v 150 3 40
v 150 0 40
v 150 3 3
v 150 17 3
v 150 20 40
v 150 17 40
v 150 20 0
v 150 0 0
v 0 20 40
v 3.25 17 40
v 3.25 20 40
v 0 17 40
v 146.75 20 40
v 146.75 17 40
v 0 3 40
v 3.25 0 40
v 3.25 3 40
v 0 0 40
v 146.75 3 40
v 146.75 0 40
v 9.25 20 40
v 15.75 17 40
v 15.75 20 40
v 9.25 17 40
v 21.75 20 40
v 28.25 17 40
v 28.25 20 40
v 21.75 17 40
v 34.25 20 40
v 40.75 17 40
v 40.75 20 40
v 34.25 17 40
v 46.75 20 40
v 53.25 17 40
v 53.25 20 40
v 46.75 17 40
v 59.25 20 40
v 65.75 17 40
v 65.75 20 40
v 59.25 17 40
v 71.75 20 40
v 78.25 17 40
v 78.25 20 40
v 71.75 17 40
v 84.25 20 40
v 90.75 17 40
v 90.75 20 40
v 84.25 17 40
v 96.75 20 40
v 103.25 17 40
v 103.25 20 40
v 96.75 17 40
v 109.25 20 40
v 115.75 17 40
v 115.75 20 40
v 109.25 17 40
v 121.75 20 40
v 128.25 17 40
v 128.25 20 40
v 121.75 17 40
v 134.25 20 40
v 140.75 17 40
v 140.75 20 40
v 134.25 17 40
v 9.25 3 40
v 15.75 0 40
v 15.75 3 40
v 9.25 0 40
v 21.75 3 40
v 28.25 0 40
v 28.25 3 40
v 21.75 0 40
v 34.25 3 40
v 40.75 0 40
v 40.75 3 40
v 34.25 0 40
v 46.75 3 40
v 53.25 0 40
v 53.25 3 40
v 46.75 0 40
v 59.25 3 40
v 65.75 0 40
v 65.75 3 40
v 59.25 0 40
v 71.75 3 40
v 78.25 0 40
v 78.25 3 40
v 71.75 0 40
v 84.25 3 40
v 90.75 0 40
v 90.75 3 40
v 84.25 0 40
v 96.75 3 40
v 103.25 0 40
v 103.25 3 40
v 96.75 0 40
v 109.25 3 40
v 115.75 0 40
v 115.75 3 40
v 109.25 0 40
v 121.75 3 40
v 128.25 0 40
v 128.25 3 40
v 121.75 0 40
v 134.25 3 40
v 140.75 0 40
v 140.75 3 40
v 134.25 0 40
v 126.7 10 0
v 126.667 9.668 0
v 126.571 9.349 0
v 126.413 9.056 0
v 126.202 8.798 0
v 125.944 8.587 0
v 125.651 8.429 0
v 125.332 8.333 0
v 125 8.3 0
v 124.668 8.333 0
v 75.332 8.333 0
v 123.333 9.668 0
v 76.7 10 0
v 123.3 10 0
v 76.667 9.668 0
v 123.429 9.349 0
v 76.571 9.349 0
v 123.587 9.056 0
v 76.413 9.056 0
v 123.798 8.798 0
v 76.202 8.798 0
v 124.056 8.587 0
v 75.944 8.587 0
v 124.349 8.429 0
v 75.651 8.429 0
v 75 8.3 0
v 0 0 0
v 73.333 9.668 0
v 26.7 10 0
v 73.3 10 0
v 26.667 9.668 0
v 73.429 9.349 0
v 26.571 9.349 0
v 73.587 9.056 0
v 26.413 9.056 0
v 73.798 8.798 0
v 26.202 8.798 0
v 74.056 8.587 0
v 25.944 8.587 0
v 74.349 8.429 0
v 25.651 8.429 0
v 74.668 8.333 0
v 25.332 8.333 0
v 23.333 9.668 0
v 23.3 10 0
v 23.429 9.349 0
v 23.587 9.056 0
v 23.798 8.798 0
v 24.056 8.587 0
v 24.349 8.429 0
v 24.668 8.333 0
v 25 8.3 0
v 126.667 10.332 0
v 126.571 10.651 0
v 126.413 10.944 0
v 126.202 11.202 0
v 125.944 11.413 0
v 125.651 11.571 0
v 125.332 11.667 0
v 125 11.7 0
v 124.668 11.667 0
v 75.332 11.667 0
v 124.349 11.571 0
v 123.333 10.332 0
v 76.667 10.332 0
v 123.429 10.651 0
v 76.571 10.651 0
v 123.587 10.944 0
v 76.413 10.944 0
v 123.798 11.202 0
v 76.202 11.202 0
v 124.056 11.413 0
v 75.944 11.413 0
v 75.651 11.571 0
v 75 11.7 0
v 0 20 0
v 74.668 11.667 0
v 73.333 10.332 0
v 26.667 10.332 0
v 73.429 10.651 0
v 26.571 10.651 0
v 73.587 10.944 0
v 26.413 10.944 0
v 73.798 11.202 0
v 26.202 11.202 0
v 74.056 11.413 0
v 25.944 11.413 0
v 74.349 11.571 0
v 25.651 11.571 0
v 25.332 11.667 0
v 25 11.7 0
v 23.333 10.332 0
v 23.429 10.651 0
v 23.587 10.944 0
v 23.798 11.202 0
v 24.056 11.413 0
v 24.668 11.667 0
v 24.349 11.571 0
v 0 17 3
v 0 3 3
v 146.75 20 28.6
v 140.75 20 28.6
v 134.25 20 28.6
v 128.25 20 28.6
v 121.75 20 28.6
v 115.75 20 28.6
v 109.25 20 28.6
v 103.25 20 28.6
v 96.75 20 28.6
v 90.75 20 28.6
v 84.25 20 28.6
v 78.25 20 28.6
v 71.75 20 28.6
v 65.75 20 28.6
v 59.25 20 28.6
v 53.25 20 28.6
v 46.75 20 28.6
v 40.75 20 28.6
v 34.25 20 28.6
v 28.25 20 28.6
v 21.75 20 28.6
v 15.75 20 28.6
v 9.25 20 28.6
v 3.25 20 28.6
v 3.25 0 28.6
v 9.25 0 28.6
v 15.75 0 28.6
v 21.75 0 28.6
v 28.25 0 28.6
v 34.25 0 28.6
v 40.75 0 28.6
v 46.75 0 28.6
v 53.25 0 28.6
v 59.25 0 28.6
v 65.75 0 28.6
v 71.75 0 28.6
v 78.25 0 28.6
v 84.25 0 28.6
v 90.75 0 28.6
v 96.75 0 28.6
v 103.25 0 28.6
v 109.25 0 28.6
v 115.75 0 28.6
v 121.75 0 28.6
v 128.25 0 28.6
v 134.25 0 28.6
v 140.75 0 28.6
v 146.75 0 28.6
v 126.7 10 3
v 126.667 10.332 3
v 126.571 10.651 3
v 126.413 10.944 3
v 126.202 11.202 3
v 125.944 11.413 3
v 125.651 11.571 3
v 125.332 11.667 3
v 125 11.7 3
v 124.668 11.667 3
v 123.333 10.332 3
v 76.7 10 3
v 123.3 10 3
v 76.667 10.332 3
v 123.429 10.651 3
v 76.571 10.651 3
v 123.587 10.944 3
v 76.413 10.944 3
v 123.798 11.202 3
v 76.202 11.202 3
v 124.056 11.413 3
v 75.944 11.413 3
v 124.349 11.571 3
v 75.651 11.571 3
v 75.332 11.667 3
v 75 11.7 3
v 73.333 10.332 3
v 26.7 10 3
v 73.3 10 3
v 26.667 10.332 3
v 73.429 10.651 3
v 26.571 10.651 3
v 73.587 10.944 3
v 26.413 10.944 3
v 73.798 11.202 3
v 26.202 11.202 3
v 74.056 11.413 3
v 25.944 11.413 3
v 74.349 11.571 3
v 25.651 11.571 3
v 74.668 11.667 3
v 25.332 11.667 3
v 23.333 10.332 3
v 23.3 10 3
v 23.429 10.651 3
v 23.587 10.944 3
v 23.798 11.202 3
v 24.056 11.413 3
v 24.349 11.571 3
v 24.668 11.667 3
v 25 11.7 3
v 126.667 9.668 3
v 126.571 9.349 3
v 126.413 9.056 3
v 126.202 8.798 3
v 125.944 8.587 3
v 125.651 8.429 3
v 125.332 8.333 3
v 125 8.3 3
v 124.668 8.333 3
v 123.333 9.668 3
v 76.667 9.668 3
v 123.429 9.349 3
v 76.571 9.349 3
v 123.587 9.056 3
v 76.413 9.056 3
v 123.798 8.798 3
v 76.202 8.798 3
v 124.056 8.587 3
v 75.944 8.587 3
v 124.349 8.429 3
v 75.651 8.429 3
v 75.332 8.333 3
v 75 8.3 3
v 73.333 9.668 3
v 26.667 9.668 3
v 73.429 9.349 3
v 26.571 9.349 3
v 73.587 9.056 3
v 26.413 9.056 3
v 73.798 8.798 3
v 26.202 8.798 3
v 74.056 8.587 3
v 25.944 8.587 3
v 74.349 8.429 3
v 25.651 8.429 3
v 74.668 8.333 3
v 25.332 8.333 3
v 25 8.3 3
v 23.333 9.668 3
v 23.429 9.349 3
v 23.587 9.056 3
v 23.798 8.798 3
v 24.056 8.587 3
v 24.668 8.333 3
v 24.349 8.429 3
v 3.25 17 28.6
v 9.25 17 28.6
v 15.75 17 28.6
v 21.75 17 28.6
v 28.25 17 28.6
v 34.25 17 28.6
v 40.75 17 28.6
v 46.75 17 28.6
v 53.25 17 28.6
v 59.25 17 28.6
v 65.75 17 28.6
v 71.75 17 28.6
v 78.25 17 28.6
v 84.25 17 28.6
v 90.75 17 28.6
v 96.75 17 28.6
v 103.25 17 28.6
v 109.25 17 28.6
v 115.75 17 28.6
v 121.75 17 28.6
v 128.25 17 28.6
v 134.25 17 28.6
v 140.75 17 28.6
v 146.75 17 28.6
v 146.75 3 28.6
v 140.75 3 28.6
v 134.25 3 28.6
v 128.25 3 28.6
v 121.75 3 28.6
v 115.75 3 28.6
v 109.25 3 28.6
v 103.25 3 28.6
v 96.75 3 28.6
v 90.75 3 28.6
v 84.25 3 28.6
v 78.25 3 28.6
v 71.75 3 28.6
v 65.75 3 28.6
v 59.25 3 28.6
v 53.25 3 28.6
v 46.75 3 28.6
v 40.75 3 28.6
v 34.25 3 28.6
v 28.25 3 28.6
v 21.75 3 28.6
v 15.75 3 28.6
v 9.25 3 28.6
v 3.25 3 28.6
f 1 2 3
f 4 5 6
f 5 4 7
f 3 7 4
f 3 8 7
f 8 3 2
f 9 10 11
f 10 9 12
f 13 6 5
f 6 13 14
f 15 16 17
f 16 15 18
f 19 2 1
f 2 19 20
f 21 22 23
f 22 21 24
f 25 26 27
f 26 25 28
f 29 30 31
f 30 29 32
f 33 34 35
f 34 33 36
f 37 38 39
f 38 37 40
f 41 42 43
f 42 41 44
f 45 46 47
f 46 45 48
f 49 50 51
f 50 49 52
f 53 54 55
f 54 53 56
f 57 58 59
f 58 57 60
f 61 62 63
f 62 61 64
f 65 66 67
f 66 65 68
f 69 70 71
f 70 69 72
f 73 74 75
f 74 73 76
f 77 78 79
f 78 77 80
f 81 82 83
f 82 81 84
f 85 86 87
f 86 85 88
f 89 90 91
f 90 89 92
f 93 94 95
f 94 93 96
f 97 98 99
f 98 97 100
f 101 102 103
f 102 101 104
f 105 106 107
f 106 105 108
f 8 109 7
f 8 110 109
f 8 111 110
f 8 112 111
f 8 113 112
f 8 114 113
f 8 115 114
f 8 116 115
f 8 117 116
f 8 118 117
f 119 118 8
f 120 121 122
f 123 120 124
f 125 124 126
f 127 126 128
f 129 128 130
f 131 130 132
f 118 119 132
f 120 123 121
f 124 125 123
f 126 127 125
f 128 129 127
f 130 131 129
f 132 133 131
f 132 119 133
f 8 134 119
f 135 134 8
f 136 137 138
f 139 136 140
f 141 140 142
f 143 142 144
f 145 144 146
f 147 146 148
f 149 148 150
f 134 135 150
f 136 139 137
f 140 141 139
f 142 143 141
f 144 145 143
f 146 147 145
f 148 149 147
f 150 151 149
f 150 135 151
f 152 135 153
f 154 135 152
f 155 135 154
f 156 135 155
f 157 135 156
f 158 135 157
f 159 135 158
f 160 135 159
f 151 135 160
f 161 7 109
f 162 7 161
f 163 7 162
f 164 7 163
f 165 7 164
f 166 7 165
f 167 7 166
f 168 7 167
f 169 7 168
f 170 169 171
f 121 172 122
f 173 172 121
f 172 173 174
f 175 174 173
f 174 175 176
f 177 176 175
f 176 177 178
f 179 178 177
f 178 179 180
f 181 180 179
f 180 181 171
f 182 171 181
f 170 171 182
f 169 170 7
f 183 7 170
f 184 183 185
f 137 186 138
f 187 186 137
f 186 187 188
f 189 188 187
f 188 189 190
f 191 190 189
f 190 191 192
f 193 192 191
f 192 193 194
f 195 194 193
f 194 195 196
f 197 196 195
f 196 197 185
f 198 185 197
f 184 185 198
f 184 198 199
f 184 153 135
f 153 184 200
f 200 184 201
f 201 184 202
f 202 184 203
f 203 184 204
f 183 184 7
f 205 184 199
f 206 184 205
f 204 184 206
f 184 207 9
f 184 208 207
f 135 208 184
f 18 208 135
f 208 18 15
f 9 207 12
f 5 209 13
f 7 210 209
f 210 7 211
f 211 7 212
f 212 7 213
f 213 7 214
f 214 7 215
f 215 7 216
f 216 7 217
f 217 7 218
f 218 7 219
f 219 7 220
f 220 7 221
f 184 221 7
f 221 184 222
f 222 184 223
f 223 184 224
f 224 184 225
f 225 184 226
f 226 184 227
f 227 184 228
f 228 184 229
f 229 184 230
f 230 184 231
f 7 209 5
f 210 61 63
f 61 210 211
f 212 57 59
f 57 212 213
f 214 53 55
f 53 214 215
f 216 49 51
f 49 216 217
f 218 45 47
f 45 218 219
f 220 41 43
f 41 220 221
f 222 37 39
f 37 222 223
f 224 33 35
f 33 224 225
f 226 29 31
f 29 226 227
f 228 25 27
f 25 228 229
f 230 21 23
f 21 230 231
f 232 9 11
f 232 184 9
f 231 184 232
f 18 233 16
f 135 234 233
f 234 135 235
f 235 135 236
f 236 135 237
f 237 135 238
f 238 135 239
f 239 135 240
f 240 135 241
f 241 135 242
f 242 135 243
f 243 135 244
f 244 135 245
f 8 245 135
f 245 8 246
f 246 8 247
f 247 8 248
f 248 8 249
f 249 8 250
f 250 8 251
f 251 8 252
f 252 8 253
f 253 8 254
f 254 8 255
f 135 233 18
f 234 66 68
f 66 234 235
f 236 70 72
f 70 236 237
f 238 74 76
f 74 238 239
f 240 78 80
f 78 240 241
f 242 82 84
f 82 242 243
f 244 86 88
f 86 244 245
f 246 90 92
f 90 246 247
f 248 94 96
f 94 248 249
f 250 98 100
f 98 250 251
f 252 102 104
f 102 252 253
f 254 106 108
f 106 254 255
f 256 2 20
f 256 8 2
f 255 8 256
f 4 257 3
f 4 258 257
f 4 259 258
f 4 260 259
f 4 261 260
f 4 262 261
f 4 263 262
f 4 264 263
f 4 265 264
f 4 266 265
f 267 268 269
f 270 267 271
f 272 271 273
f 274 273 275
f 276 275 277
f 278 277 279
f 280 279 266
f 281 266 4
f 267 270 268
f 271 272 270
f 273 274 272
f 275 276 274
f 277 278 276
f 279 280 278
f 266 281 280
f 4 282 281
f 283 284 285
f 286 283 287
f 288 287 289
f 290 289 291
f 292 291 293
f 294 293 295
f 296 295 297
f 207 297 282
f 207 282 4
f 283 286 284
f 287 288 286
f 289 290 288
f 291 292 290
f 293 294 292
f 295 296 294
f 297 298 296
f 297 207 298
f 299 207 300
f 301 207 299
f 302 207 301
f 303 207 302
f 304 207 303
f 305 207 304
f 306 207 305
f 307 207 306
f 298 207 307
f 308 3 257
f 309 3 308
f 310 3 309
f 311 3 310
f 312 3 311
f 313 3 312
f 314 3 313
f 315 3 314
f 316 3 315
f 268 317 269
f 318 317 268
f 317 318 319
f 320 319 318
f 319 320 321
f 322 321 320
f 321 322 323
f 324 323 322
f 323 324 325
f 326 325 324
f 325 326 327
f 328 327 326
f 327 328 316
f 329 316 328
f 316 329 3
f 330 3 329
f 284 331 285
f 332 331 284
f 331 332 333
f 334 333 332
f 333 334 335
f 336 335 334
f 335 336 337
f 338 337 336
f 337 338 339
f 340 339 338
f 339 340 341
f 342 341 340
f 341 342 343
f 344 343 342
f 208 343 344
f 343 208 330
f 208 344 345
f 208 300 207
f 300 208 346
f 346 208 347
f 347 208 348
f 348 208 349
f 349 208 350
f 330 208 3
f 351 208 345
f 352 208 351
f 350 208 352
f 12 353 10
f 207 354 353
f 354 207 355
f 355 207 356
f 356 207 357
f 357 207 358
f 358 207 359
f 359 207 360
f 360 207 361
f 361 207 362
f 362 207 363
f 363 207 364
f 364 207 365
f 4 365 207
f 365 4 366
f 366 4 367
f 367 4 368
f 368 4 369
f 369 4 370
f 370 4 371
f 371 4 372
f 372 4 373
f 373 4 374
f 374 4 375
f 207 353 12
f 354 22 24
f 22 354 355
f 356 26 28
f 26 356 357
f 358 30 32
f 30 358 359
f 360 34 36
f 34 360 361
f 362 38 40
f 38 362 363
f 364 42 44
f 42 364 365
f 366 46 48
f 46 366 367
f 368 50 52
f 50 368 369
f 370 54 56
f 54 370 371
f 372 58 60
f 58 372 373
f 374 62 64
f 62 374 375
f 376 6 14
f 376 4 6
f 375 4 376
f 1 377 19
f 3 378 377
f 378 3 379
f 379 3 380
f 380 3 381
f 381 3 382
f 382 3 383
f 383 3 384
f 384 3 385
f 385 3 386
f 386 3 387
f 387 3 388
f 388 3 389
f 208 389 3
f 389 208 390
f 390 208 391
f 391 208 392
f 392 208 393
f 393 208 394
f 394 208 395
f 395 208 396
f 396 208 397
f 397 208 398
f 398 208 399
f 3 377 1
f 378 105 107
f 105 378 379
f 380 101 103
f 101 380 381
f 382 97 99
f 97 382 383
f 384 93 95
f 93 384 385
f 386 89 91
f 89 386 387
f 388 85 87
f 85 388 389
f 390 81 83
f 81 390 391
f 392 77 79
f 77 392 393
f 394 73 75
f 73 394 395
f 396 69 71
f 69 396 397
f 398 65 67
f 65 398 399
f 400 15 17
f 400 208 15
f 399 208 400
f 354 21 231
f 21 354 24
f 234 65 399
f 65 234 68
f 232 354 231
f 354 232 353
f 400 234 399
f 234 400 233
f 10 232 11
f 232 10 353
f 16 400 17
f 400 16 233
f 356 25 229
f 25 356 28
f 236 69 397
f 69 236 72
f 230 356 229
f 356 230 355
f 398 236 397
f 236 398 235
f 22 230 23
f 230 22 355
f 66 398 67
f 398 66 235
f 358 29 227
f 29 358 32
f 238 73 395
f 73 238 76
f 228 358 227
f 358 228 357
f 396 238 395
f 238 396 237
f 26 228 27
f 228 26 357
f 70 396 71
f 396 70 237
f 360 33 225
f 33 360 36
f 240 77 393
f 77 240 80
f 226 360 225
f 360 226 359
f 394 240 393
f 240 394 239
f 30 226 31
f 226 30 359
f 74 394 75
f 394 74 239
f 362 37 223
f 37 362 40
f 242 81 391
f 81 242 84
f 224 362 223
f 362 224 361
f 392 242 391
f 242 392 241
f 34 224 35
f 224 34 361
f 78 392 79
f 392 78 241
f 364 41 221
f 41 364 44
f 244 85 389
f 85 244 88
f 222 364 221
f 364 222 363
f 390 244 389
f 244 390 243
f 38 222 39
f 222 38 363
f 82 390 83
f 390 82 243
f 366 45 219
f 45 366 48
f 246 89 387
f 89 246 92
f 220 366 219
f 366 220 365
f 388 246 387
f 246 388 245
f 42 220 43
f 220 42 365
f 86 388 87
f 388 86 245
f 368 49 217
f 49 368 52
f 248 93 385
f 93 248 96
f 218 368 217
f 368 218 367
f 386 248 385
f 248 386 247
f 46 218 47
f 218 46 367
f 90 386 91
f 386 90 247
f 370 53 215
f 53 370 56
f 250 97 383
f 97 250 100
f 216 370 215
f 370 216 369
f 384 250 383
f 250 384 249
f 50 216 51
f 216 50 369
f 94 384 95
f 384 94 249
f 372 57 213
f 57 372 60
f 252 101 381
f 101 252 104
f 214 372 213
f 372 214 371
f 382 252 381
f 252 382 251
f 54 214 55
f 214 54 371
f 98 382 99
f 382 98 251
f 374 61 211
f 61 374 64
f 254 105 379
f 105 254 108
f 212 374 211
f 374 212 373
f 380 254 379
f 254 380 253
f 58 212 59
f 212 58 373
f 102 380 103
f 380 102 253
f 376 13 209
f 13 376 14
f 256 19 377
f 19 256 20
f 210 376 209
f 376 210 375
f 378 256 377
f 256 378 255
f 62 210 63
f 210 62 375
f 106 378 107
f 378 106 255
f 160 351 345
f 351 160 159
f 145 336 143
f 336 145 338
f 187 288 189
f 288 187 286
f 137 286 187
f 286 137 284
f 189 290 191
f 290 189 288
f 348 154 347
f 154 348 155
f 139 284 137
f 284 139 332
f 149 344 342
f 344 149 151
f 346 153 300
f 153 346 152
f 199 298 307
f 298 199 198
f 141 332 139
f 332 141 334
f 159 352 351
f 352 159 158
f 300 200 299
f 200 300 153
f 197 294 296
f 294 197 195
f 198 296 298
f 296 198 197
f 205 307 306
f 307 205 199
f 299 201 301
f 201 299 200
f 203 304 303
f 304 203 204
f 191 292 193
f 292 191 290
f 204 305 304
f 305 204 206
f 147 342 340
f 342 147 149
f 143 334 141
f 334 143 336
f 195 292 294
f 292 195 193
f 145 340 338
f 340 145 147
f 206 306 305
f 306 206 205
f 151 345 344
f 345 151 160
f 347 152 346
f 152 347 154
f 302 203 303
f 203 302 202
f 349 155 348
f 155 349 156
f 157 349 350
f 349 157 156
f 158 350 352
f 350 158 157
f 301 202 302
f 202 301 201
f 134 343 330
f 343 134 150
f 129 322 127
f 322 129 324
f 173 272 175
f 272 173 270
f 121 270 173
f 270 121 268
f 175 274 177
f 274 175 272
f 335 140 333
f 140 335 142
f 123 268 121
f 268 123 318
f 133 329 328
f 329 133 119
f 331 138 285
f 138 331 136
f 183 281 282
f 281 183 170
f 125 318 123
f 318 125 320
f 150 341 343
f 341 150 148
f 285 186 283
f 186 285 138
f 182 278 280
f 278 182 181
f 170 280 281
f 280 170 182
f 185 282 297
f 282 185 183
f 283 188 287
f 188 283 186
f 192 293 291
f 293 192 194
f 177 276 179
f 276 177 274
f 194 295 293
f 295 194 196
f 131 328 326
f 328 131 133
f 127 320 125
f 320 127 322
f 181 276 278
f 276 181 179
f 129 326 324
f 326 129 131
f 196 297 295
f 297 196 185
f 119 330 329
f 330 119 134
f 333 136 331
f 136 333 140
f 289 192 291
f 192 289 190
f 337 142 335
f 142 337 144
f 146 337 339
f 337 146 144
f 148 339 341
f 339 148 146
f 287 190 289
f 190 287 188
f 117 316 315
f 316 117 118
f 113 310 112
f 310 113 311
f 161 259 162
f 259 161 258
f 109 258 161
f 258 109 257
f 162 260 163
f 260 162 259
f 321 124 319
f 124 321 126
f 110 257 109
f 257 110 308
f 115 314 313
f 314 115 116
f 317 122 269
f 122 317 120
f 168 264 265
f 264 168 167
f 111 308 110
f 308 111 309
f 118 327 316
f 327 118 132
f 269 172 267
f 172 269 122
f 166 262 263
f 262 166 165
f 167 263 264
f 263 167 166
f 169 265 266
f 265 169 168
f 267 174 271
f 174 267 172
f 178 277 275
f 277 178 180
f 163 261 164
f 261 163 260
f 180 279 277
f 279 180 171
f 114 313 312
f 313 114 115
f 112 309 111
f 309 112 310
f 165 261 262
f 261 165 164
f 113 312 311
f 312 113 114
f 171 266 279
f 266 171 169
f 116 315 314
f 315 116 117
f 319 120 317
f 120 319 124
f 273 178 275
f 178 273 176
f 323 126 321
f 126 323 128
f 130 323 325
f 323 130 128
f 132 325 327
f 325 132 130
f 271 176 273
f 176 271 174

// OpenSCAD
$fn = 32;

// ----------------------------------------------------------------------
// Cable duct: 150 x 20 x 40 mm, 12 fingers
// ----------------------------------------------------------------------

// --- parameters (mm) ---
channel_l = 150;          // duct length, X
channel_w = 20;           // duct width, Y
channel_h = 40;           // duct height, Z
channel_t = 3;            // side wall thickness
floor_t = 3;              // floor thickness
slot_w = 6;               // finger slot width
slot_h = 25.6;            // finger slot height
fingers = 12;             // number of finger slots per side
pitch = 12.5;             // finger pitch
hole_d = 3.4;             // floor mounting hole
hole_n = 3;               // mounting holes in the floor

module shell() {
  difference() {
    cube([channel_l, channel_w, channel_h]);
    /* open top channel */
    translate([-channel_t - 1, channel_t, floor_t])
      cube([channel_l + 2 * channel_t + 2, channel_w - 2 * channel_t, channel_h + 1]);
  }
}

difference() {
  union() {
    shell();
  }
  /* finger slots cut through both side walls */
  for (i = [0 : fingers - 1]) translate([pitch / 2 + i * pitch - slot_w / 2, -1, floor_t + slot_h]) cube([slot_w, channel_w + 2, channel_h]);
  for (i = [0 : hole_n - 1]) translate([(channel_l / hole_n) * (i + 0.5), channel_w / 2, -1]) cylinder(h = floor_t + 2, d = hole_d);
}
